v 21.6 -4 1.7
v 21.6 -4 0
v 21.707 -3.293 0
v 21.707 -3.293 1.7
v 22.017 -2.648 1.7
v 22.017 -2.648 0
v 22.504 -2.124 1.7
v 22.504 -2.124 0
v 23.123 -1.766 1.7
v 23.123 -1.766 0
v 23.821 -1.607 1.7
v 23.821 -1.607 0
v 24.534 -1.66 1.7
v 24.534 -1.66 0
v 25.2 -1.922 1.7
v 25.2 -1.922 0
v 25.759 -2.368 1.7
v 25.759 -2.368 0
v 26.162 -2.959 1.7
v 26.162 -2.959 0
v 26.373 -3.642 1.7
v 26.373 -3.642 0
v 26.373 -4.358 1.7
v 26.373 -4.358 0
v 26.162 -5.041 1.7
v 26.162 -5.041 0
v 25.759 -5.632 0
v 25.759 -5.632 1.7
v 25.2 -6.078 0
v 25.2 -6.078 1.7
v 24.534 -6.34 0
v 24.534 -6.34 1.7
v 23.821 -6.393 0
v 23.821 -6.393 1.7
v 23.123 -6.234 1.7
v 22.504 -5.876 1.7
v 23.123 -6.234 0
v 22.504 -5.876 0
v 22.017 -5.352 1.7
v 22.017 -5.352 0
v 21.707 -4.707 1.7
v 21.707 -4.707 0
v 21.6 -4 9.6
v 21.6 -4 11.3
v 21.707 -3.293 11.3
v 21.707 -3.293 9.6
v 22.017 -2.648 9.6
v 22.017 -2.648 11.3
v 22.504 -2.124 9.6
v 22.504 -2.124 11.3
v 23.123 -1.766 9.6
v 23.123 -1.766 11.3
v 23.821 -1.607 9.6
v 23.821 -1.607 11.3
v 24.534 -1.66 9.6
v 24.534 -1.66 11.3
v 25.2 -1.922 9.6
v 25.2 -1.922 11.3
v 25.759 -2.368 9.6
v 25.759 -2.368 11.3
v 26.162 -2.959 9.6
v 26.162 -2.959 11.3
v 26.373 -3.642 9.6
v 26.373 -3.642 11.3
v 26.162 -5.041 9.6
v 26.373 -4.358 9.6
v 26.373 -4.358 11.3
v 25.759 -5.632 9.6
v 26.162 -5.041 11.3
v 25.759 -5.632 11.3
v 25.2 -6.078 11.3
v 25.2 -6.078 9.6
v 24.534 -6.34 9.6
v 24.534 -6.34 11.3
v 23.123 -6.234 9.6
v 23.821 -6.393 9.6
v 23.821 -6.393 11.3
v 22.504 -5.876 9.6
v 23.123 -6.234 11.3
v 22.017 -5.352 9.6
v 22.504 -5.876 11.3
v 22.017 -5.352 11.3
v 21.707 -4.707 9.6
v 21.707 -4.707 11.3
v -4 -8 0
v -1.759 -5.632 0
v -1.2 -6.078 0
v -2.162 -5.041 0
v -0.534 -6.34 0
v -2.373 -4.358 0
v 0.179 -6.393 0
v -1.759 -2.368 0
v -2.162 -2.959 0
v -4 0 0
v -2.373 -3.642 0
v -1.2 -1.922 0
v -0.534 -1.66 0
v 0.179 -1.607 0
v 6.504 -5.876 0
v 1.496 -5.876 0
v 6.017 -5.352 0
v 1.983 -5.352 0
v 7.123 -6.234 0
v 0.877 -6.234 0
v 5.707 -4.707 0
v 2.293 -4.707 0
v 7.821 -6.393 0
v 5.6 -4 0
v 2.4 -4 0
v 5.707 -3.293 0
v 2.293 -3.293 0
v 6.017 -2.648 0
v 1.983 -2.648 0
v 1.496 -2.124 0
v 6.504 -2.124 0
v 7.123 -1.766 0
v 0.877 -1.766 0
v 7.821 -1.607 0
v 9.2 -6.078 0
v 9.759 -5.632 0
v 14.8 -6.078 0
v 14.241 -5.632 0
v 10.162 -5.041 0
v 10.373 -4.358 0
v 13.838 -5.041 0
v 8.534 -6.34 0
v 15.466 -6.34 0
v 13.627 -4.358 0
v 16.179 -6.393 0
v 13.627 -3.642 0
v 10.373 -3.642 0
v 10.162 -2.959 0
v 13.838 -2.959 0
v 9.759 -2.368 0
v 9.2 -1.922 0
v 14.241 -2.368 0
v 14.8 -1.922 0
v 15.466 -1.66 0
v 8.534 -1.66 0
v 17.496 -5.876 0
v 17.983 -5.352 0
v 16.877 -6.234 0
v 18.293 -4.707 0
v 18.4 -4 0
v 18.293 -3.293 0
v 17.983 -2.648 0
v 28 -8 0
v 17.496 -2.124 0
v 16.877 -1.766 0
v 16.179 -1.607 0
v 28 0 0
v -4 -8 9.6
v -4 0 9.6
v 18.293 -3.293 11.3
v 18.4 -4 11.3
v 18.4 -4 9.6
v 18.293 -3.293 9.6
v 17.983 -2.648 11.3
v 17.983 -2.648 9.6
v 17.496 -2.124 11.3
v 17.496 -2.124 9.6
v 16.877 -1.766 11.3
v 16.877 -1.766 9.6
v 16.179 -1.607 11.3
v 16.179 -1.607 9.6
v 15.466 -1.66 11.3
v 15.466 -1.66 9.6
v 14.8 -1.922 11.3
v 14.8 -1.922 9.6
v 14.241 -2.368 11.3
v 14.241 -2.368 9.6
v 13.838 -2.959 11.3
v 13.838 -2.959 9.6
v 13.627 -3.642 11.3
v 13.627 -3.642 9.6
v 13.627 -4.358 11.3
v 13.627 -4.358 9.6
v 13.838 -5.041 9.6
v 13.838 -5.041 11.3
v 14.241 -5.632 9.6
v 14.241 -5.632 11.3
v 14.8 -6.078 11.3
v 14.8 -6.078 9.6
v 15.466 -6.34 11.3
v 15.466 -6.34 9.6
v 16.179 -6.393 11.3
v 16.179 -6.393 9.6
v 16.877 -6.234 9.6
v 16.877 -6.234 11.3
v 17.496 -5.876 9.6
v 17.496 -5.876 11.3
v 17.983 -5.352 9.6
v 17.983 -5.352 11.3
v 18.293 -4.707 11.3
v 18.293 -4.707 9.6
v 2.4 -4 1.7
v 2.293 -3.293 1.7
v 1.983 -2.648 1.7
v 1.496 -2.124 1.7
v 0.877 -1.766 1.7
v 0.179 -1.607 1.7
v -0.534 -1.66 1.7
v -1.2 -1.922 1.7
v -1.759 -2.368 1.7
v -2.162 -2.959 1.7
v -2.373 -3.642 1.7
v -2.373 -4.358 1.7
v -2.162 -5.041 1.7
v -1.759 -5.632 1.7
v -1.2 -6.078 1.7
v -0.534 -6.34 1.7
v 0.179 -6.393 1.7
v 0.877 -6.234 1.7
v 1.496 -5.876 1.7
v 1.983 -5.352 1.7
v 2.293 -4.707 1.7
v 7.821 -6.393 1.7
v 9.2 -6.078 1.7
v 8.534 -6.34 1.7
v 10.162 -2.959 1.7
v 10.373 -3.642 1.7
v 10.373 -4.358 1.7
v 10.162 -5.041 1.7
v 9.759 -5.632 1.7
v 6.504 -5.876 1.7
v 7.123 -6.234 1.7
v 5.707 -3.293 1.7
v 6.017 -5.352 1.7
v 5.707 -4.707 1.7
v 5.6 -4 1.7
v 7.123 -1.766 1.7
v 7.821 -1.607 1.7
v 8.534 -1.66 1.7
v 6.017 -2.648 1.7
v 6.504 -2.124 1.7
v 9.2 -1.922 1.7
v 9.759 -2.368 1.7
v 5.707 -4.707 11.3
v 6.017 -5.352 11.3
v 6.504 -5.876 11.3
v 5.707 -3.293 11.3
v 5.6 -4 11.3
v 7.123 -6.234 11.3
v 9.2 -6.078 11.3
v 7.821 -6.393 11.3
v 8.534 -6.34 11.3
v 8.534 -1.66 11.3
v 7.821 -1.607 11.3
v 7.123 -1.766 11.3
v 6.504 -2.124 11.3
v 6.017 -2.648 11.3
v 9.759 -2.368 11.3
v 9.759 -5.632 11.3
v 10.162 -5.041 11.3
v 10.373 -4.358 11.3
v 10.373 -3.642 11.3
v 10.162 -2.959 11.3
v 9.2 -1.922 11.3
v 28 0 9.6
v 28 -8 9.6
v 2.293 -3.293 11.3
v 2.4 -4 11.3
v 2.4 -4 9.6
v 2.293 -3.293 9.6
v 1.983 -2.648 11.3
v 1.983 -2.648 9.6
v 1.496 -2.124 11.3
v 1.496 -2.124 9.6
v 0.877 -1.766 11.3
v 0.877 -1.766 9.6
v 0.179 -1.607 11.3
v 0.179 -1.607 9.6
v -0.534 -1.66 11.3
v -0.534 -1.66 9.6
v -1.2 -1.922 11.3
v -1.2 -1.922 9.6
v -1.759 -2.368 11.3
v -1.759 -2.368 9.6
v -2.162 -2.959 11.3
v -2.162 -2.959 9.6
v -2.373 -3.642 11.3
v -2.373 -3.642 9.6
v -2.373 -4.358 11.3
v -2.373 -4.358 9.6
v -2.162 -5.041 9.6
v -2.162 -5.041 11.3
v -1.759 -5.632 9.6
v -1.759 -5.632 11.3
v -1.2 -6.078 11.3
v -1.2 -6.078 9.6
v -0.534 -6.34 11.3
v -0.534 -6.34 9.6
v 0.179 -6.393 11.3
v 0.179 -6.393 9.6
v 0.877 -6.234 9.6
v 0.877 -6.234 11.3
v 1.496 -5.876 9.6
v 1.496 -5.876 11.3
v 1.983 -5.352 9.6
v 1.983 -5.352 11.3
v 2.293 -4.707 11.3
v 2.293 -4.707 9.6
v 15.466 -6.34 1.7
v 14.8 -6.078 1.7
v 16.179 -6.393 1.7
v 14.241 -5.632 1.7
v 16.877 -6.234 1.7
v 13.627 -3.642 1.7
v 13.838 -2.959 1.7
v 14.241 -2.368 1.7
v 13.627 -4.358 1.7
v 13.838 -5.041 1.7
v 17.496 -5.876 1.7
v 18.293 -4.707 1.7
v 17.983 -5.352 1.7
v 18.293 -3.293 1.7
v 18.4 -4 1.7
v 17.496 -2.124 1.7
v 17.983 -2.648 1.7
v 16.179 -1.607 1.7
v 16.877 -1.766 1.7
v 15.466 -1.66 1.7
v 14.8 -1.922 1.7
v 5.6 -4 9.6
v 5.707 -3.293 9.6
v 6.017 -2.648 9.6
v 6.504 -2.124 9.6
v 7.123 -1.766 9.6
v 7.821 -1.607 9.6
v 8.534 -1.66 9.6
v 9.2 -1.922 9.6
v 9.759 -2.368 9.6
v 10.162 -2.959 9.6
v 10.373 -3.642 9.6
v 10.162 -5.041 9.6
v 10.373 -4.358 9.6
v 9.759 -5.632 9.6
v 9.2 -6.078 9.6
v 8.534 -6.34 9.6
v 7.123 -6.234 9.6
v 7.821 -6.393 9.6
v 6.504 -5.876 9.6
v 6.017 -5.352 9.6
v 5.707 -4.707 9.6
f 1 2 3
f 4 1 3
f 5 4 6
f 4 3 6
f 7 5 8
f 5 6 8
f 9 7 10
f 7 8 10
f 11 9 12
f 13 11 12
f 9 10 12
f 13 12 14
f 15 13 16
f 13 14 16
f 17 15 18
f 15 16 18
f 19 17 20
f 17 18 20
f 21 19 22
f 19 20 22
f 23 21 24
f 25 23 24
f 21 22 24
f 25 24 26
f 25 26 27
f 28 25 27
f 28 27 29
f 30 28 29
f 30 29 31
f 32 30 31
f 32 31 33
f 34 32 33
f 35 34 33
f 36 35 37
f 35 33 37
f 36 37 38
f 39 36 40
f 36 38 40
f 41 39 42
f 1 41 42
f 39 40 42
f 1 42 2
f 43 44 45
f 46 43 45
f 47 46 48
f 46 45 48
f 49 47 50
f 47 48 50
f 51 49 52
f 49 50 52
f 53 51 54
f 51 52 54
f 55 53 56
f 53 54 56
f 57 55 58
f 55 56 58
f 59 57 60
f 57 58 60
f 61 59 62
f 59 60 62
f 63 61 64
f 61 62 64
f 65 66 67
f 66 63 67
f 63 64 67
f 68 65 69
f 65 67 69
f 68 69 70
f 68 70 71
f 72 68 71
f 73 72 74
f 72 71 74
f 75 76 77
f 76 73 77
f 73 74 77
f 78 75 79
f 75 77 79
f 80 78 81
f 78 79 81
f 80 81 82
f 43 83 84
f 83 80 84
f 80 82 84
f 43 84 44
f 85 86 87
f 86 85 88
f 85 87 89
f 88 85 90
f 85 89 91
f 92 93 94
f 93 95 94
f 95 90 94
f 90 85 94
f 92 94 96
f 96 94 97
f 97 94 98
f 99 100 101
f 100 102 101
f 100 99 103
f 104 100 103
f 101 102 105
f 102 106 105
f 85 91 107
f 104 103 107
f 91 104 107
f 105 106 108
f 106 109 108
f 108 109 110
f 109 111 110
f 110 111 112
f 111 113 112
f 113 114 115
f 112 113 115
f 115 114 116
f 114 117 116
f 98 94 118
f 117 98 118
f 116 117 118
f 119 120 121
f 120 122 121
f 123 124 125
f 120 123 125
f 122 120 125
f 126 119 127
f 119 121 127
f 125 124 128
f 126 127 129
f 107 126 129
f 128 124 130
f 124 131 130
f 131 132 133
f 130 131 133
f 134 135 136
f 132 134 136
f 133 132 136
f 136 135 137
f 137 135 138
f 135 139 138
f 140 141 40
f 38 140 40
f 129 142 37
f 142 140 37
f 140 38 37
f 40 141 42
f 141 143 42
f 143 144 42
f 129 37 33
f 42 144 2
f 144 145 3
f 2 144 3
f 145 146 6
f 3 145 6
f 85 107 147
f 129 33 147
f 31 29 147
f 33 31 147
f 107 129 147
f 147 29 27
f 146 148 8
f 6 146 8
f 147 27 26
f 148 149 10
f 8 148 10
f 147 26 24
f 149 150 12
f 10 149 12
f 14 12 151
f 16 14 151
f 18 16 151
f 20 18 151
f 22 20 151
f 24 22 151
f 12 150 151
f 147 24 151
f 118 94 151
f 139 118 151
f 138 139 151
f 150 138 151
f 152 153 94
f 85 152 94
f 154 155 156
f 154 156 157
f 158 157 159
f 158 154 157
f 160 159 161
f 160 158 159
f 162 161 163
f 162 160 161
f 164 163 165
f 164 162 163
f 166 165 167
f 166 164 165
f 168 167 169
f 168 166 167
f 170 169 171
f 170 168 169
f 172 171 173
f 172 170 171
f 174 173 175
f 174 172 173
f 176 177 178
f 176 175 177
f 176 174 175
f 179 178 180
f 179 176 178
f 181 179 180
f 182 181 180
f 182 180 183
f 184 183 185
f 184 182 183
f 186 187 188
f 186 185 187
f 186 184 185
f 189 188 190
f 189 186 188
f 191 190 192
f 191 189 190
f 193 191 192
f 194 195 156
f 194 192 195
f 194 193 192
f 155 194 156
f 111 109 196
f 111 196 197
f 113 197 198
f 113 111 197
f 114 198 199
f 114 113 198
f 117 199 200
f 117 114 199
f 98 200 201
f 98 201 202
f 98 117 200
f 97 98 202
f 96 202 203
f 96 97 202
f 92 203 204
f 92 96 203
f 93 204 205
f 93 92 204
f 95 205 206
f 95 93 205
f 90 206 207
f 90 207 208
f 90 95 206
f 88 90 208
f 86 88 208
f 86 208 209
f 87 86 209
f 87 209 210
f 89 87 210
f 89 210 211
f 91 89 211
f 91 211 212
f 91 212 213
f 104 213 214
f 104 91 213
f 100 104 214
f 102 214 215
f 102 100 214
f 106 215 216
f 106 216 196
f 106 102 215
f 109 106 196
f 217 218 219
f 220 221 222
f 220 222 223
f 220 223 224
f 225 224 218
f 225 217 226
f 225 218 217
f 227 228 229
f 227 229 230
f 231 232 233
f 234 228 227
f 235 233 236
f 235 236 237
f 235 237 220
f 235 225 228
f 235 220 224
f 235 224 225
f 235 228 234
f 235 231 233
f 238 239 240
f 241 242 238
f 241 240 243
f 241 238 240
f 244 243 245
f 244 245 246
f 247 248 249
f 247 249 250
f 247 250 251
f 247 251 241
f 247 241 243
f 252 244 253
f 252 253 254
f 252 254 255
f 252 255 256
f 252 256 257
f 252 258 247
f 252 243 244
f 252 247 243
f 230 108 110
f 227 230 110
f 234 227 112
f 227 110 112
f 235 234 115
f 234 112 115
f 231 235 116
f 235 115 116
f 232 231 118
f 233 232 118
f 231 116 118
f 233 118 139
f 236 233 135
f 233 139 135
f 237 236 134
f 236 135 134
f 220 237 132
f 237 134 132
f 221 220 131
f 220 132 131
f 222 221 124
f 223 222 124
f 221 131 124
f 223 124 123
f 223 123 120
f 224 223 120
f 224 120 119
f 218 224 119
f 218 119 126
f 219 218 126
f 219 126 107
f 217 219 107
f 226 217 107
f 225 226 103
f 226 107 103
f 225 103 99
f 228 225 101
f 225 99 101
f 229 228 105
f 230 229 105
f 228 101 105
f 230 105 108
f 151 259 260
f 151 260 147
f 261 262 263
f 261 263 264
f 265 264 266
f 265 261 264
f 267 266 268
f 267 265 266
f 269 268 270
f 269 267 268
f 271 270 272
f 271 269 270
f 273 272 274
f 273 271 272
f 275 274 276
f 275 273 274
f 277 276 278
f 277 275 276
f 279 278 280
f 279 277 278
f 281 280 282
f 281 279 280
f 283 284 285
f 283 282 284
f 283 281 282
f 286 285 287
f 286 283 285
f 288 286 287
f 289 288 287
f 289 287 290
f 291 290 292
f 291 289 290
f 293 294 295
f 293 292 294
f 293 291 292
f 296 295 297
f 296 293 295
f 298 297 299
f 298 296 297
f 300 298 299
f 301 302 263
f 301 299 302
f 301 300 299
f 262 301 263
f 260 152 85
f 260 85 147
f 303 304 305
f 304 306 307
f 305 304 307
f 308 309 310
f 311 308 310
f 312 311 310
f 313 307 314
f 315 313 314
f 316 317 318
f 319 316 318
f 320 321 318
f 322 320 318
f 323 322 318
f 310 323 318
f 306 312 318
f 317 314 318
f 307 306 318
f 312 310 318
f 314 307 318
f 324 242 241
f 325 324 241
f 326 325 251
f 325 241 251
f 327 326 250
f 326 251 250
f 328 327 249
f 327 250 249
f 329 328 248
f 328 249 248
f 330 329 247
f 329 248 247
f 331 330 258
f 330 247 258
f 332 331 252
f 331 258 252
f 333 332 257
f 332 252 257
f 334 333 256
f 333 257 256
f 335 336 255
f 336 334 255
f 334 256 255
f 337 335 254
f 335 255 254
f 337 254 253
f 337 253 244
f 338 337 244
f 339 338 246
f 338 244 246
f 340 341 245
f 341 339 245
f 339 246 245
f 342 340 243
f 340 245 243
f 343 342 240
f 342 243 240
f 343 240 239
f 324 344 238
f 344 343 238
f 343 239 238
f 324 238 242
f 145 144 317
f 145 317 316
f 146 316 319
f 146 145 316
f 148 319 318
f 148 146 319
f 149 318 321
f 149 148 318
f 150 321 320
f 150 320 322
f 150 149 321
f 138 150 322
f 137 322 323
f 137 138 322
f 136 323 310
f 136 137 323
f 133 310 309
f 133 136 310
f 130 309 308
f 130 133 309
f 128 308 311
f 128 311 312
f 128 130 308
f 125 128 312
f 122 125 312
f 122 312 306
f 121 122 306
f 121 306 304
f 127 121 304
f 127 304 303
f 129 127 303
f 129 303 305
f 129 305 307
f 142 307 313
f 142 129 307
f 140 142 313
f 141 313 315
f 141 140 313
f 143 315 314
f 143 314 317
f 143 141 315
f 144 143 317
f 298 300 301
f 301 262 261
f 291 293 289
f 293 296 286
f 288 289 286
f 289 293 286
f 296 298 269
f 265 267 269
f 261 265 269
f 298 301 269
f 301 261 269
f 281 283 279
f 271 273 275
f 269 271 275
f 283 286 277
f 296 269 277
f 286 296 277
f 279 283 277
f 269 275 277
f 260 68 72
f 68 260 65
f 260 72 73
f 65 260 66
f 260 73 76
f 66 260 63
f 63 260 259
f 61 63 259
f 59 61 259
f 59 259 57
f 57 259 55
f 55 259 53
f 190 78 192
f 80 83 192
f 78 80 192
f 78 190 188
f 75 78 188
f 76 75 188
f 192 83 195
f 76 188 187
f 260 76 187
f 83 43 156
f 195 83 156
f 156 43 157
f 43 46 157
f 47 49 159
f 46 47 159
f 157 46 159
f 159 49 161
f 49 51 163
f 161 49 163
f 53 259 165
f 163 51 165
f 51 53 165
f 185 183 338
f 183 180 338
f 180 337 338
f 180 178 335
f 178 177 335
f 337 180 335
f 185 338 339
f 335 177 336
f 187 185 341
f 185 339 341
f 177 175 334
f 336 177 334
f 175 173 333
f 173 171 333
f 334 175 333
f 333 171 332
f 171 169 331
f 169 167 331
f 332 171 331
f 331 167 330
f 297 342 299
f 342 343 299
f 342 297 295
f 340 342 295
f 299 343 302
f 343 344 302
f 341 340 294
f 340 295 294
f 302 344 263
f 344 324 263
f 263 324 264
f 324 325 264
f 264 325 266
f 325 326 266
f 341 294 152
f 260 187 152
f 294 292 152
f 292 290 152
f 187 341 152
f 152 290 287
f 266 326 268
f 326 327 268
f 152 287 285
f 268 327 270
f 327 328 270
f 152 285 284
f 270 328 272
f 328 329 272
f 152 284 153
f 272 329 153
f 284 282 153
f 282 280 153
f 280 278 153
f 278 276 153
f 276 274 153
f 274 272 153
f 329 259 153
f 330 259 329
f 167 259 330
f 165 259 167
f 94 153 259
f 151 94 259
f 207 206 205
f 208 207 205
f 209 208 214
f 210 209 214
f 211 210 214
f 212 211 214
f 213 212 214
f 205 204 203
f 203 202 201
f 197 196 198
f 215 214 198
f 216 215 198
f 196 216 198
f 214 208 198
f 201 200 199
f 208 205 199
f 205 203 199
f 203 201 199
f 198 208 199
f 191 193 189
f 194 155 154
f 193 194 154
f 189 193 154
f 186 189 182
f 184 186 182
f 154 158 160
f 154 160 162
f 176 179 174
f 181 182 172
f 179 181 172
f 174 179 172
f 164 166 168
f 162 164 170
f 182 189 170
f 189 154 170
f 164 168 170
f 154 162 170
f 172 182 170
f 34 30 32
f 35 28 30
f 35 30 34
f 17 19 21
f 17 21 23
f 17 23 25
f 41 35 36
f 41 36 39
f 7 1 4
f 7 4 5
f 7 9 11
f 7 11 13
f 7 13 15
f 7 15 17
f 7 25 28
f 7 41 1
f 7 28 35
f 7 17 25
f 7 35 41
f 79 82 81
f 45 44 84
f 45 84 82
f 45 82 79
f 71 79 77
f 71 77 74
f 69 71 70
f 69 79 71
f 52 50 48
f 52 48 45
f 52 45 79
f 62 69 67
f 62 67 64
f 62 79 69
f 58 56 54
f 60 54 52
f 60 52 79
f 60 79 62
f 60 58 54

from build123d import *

# Parameters (mm, degrees)
F1_DEPTH = 8
F3_W     = 8
F3_H     = 8
F3_R     = 2.4
F4_DEPTH = 1.7
F5_R     = 2.4
F6_DEPTH = 1.7


with BuildPart() as f1:
    # F0 (on Front) → F1 (new body)
    with BuildSketch(Plane.XZ):
        Polygon((-2.4, 9.6), (-4, 9.6), (-4, 0), (4, 0), (4, 9.6), (2.4, 9.6), (2.4, 11.3), (-2.4, 11.3), align=None)
    extrude(amount=F1_DEPTH)

    # F3 (on plane+point) → F4 (cut, through all)
    with BuildSketch(Plane.XY.offset(11.3)):
        with Locations((0, -4)):
            Rectangle(F3_W, F3_H)
        with Locations((0, -4)):
            Circle(F3_R, mode=Mode.SUBTRACT)
    extrude(amount=-F4_DEPTH, mode=Mode.SUBTRACT)

    # F5 (on Top) → F6 (cut)
    with BuildSketch(Plane.XY):
        with Locations((0, -4)):
            Circle(F5_R)
    extrude(amount=F6_DEPTH, mode=Mode.SUBTRACT)

    # F8: F1 across plane


with BuildPart() as f1_1:
    add(f1.part)
    add(f1.part.mirror(Plane.YZ.offset(4)))

    # F10: F1 across plane


with BuildPart() as f1_2:
    add(f1_1.part)
    add(f1_1.part.mirror(Plane.YZ.offset(12)))


solid = f1_2.part
